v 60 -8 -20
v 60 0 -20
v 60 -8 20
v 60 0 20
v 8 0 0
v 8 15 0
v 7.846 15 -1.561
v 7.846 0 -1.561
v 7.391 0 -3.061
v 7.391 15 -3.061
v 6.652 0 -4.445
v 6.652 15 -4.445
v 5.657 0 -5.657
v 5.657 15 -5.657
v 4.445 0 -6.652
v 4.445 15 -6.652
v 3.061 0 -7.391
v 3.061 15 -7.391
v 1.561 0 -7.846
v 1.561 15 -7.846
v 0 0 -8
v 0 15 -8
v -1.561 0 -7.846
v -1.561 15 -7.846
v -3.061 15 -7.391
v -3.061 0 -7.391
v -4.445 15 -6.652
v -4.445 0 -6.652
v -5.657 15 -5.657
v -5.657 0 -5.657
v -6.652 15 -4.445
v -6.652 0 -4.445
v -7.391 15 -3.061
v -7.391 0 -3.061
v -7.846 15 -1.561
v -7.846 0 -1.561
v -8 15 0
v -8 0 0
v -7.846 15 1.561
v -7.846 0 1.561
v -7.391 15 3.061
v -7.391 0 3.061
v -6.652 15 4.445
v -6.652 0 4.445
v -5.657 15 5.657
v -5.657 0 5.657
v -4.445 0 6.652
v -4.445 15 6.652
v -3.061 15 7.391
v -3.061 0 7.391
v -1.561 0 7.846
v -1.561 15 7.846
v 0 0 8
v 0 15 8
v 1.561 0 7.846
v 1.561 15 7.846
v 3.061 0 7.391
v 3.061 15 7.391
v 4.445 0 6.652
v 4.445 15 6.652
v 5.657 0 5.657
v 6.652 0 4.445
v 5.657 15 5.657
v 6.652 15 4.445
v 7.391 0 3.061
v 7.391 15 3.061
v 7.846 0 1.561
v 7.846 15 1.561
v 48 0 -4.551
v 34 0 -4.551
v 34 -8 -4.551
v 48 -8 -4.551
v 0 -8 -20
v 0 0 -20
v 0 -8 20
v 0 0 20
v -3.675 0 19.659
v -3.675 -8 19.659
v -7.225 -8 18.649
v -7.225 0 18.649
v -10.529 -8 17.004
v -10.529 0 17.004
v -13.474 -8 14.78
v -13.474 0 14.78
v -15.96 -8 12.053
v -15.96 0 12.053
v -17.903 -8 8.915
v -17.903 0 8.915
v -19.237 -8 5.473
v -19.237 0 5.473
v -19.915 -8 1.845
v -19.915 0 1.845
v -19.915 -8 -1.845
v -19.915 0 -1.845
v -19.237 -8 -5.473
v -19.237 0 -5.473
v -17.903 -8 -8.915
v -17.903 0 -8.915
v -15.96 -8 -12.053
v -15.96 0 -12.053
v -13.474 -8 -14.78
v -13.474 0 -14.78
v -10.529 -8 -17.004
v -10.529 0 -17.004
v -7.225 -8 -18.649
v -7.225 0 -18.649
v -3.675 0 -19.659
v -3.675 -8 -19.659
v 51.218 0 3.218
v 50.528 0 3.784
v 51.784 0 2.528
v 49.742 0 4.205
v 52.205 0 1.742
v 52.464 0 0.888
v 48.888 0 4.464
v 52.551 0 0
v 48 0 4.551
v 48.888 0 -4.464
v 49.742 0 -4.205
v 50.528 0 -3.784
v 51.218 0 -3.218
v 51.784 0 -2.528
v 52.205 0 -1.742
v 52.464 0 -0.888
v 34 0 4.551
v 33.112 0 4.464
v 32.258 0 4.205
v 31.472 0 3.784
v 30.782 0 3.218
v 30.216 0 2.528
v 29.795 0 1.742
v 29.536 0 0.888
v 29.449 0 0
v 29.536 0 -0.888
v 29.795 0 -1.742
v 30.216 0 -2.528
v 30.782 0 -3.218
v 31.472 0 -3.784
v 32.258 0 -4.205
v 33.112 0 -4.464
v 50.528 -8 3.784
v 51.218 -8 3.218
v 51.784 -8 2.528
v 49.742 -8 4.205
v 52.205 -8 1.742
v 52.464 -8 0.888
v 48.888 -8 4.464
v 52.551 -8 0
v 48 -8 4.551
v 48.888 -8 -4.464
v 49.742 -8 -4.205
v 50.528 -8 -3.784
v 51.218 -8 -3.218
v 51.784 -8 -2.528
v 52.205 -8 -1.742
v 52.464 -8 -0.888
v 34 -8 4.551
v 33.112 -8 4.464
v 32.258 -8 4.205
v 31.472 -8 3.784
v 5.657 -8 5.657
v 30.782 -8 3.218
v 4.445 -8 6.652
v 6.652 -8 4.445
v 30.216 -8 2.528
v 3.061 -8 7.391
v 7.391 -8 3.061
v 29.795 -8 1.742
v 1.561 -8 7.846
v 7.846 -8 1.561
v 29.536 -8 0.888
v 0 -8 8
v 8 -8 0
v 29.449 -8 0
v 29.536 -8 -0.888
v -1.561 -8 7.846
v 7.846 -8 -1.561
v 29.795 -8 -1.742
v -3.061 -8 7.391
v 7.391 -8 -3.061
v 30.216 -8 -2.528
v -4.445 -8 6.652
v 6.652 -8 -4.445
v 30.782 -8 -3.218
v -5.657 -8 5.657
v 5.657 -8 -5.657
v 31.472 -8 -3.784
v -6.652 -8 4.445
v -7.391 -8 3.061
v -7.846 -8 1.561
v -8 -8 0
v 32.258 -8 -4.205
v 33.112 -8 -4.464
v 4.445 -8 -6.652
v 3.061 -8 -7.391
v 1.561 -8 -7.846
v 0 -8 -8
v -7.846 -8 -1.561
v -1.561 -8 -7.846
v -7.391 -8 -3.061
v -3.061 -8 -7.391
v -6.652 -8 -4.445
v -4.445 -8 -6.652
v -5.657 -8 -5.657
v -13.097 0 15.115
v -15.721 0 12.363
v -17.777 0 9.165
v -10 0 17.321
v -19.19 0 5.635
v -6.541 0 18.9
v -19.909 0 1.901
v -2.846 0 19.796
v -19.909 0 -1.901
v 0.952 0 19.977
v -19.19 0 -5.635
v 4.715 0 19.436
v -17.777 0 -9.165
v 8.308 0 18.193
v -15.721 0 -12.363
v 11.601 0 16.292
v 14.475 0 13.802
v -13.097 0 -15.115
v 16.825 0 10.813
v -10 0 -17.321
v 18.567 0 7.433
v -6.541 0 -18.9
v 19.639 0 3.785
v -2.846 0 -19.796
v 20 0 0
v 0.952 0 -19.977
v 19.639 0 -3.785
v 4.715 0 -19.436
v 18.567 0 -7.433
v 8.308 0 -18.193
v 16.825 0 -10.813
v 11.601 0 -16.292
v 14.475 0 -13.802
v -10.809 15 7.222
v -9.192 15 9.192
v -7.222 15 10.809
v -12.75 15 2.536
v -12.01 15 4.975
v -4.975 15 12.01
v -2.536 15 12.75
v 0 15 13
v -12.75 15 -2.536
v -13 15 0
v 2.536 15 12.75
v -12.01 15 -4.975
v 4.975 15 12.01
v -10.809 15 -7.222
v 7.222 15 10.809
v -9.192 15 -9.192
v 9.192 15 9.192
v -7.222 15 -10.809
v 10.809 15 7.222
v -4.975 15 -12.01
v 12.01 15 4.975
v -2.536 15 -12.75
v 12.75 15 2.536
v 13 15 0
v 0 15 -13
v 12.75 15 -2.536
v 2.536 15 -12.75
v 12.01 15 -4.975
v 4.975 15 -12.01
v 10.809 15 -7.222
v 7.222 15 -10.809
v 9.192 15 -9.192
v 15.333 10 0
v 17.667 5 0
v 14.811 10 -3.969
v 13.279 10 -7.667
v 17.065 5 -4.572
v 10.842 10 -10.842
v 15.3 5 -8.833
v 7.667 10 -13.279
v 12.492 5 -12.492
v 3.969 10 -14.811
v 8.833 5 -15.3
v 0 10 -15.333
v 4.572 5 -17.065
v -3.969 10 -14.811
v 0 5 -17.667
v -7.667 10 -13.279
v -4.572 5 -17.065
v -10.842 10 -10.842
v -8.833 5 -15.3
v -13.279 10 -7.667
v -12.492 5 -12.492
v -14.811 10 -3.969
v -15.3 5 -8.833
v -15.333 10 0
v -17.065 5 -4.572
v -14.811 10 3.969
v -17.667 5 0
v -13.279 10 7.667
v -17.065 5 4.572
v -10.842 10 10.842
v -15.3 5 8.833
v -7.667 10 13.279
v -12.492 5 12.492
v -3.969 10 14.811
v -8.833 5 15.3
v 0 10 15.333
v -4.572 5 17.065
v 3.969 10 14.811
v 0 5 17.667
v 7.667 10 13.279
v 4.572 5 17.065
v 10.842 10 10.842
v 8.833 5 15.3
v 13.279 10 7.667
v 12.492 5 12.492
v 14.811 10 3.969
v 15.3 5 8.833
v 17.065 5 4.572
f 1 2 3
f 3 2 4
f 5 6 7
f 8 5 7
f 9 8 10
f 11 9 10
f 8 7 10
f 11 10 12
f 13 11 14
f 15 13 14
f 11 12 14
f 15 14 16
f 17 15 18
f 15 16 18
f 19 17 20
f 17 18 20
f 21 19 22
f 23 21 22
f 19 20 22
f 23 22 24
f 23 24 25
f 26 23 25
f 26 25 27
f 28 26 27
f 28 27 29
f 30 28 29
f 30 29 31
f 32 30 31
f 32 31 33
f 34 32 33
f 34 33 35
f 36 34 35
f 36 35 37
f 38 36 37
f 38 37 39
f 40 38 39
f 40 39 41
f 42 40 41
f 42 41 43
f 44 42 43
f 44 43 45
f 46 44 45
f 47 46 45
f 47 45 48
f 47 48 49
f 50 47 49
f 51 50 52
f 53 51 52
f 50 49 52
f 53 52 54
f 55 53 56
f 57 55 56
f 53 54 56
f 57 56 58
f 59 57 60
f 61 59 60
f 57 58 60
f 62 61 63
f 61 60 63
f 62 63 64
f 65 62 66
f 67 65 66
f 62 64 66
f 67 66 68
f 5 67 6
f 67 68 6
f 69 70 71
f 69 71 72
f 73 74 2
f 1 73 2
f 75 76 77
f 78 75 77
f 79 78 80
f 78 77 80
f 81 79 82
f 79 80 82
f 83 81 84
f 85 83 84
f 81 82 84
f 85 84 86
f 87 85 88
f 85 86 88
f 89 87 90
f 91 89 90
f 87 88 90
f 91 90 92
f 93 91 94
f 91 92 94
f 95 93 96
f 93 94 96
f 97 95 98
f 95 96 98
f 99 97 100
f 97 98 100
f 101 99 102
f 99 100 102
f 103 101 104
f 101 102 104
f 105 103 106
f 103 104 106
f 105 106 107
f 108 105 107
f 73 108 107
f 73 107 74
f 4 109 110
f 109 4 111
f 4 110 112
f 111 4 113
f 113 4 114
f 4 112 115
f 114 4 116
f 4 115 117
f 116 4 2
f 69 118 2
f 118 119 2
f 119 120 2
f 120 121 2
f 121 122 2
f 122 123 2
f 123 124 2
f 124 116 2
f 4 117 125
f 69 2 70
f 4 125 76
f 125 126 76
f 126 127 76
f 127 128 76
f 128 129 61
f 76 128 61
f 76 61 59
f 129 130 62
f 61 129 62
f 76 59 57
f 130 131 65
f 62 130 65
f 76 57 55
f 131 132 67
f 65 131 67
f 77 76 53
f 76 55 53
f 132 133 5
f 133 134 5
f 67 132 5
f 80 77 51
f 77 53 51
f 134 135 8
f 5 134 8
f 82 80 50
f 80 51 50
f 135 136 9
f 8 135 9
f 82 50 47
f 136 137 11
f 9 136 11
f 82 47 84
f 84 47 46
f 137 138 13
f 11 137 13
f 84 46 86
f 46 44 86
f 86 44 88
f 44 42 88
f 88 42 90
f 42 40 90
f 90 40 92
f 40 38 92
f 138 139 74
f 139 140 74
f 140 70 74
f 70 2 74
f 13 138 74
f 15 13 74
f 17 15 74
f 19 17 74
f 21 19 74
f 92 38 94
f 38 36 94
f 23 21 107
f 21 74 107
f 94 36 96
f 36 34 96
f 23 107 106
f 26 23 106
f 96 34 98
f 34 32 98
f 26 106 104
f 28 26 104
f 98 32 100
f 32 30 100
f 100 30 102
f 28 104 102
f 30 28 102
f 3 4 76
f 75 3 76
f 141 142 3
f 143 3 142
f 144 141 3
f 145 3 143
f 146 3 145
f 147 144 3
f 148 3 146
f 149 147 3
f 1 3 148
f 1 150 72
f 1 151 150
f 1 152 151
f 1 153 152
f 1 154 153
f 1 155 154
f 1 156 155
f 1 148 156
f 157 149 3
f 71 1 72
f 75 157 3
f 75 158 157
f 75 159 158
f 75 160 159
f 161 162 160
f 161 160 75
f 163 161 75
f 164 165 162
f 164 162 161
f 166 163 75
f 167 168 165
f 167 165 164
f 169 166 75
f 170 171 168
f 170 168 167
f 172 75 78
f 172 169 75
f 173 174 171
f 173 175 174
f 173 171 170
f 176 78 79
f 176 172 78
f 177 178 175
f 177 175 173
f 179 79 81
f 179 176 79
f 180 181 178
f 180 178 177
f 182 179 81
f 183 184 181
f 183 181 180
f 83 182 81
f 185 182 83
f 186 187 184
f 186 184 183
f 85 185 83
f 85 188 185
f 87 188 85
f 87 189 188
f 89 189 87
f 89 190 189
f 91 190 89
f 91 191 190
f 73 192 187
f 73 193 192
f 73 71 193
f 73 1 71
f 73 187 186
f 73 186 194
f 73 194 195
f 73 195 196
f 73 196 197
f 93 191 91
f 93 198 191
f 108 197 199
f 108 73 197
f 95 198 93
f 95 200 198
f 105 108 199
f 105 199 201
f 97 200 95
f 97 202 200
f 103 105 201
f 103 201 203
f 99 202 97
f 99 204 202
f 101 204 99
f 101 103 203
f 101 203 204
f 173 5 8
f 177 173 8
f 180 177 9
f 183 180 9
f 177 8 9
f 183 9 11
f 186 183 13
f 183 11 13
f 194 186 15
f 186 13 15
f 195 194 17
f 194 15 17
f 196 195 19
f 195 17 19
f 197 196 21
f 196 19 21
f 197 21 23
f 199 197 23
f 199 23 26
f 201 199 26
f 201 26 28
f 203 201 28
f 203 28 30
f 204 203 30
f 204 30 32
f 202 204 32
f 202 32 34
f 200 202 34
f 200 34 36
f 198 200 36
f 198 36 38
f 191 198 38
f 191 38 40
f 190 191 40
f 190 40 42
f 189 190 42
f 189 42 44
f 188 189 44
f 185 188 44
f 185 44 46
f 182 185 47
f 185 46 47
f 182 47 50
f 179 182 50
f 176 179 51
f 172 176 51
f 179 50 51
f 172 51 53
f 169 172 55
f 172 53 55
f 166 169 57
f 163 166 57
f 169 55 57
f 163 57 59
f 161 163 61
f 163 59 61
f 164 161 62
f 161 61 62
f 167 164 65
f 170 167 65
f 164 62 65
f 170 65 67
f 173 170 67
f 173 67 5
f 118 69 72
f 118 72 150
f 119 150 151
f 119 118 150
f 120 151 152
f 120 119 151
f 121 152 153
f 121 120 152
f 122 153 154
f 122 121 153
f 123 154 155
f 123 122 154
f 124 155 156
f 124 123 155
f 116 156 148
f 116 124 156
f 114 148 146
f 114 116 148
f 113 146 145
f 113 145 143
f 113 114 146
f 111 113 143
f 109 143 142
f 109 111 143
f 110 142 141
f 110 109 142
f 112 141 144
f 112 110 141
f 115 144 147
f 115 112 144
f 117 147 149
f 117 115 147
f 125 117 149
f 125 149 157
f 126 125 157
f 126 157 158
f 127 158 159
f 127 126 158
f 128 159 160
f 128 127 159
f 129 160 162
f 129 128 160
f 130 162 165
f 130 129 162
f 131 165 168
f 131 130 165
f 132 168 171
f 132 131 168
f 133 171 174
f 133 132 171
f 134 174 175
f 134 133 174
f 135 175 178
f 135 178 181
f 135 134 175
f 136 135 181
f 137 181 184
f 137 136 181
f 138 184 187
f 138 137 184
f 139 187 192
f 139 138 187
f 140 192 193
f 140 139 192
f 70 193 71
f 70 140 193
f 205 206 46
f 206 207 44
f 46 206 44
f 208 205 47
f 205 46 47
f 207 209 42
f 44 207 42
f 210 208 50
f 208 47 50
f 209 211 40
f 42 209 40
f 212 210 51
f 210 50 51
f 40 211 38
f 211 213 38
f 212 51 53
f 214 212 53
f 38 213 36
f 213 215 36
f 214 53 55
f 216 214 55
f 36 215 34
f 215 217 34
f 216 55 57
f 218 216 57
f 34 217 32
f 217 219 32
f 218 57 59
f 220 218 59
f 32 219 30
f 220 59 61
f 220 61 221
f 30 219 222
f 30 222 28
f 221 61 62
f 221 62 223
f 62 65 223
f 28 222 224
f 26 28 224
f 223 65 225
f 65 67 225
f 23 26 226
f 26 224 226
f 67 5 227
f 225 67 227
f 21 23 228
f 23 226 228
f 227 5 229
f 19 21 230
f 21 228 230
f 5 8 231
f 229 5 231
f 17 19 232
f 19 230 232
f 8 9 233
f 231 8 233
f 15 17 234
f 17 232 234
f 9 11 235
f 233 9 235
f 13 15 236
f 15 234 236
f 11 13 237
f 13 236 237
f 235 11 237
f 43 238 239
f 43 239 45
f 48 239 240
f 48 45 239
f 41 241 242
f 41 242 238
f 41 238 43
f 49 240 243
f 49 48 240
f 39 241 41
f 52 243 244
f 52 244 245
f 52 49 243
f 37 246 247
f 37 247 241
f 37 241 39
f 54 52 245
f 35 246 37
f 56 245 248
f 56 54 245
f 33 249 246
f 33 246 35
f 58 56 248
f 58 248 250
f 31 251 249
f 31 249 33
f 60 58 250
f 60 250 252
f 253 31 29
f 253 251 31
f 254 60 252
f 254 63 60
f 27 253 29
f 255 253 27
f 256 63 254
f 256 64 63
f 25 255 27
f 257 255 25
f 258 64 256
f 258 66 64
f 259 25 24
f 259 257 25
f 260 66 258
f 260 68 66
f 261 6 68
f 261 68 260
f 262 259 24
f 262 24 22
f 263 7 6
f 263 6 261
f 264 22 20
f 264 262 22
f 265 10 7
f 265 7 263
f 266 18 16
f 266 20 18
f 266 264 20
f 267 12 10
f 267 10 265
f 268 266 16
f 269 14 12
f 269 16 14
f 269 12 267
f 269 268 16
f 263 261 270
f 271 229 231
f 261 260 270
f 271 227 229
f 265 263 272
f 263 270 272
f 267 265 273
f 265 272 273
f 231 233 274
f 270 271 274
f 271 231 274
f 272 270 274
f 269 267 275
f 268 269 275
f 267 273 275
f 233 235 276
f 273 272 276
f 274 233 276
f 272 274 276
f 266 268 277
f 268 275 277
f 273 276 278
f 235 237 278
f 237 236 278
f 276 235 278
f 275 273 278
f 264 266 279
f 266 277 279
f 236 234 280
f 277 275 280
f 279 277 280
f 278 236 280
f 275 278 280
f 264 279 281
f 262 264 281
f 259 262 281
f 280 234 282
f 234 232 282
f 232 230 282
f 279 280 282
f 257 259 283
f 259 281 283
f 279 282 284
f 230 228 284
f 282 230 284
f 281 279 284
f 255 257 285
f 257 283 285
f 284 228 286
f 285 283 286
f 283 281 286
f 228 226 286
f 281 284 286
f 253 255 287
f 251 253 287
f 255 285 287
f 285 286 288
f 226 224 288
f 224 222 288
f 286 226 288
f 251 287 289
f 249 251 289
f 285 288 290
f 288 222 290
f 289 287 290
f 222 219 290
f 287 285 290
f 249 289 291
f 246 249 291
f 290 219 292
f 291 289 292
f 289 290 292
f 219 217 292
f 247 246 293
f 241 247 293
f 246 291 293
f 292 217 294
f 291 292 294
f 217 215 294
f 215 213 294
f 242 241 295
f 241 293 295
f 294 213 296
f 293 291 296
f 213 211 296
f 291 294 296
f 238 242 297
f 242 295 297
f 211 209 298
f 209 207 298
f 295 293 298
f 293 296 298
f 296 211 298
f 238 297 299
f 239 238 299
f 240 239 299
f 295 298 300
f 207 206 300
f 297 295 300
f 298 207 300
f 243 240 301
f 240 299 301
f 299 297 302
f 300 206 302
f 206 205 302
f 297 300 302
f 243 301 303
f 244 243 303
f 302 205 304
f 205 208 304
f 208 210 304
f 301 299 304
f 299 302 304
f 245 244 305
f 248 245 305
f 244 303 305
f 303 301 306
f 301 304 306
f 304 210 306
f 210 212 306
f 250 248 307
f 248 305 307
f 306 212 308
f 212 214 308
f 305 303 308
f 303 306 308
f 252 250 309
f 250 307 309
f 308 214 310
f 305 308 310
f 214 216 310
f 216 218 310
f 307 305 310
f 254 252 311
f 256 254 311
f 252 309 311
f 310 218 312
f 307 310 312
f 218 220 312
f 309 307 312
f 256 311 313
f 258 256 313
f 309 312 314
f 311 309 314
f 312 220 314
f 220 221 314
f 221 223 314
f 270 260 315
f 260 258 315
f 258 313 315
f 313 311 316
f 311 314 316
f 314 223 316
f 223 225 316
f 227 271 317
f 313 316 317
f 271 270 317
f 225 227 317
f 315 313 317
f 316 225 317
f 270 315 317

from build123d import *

# Parameters (mm, degrees)
SKETCH2_R           = 13
SKETCH1_R           = 20
BOSS_EXTRUDE1_DEPTH = 8
CUT_EXTRUDE2_DEPTH  = 8
SKETCH7_R           = 8
CUT_EXTRUDE3_DEPTH  = 24


with BuildPart() as part:
    # Sketch2 → Loft1 section 0
    with BuildSketch(Plane(origin=(0, 15, 0), x_dir=(1, 0, 0), z_dir=(0, 1, 0))):
        Circle(SKETCH2_R)
    # Sketch1 → Loft1 section 1
    with BuildSketch(Plane(origin=(0, 0, 0), x_dir=(1, 0, 0), z_dir=(0, 1, 0))):
        Circle(SKETCH1_R)
    loft()


with BuildPart() as body_2:
    # Sketch5 → Boss-Extrude1 (new body)
    with BuildSketch(Plane(origin=(0, 0, 0), x_dir=(1, 0, 0), z_dir=(0, 1, 0))):
        with BuildLine():
            Line((0, 20), (60, 20))
            Line((60, 20), (60, -20))
            Line((60, -20), (0, -20))
            ThreePointArc((0, -20), (-20, 0), (0, 20))
        make_face()
    extrude(amount=-BOSS_EXTRUDE1_DEPTH)

    # Sketch6 → Cut-Extrude2 (cut)
    with BuildSketch(Plane(origin=(0, 0, 0), x_dir=(1, 0, 0), z_dir=(0, 1, 0))):
        with BuildLine():
            Line((34, 4.551048267), (48, 4.551048267))
            ThreePointArc((48, 4.551048267), (52.551048267, 0), (48, -4.551048267))
            Line((48, -4.551048267), (34, -4.551048267))
            ThreePointArc((34, -4.551048267), (29.448951733, 0), (34, 4.551048267))
        make_face()
    extrude(amount=-CUT_EXTRUDE2_DEPTH, mode=Mode.SUBTRACT)


with BuildPart() as cut_extrude3_tool:
    # Sketch7 → Cut-Extrude3 (new body, through all)
    with BuildSketch(Plane(origin=(0, 15, 0), x_dir=(1, 0, 0), z_dir=(0, 1, 0))):
        Circle(SKETCH7_R)
    extrude(amount=-CUT_EXTRUDE3_DEPTH)


with BuildPart() as part_1:
    add(part.part)

    # Cut-Extrude3: cut by cut_extrude3_tool
    add(cut_extrude3_tool.part, mode=Mode.SUBTRACT)


with BuildPart() as body_2_1:
    add(body_2.part)

    # Cut-Extrude3: cut by cut_extrude3_tool
    add(cut_extrude3_tool.part, mode=Mode.SUBTRACT)


solid = Compound([part_1.part, body_2_1.part])
